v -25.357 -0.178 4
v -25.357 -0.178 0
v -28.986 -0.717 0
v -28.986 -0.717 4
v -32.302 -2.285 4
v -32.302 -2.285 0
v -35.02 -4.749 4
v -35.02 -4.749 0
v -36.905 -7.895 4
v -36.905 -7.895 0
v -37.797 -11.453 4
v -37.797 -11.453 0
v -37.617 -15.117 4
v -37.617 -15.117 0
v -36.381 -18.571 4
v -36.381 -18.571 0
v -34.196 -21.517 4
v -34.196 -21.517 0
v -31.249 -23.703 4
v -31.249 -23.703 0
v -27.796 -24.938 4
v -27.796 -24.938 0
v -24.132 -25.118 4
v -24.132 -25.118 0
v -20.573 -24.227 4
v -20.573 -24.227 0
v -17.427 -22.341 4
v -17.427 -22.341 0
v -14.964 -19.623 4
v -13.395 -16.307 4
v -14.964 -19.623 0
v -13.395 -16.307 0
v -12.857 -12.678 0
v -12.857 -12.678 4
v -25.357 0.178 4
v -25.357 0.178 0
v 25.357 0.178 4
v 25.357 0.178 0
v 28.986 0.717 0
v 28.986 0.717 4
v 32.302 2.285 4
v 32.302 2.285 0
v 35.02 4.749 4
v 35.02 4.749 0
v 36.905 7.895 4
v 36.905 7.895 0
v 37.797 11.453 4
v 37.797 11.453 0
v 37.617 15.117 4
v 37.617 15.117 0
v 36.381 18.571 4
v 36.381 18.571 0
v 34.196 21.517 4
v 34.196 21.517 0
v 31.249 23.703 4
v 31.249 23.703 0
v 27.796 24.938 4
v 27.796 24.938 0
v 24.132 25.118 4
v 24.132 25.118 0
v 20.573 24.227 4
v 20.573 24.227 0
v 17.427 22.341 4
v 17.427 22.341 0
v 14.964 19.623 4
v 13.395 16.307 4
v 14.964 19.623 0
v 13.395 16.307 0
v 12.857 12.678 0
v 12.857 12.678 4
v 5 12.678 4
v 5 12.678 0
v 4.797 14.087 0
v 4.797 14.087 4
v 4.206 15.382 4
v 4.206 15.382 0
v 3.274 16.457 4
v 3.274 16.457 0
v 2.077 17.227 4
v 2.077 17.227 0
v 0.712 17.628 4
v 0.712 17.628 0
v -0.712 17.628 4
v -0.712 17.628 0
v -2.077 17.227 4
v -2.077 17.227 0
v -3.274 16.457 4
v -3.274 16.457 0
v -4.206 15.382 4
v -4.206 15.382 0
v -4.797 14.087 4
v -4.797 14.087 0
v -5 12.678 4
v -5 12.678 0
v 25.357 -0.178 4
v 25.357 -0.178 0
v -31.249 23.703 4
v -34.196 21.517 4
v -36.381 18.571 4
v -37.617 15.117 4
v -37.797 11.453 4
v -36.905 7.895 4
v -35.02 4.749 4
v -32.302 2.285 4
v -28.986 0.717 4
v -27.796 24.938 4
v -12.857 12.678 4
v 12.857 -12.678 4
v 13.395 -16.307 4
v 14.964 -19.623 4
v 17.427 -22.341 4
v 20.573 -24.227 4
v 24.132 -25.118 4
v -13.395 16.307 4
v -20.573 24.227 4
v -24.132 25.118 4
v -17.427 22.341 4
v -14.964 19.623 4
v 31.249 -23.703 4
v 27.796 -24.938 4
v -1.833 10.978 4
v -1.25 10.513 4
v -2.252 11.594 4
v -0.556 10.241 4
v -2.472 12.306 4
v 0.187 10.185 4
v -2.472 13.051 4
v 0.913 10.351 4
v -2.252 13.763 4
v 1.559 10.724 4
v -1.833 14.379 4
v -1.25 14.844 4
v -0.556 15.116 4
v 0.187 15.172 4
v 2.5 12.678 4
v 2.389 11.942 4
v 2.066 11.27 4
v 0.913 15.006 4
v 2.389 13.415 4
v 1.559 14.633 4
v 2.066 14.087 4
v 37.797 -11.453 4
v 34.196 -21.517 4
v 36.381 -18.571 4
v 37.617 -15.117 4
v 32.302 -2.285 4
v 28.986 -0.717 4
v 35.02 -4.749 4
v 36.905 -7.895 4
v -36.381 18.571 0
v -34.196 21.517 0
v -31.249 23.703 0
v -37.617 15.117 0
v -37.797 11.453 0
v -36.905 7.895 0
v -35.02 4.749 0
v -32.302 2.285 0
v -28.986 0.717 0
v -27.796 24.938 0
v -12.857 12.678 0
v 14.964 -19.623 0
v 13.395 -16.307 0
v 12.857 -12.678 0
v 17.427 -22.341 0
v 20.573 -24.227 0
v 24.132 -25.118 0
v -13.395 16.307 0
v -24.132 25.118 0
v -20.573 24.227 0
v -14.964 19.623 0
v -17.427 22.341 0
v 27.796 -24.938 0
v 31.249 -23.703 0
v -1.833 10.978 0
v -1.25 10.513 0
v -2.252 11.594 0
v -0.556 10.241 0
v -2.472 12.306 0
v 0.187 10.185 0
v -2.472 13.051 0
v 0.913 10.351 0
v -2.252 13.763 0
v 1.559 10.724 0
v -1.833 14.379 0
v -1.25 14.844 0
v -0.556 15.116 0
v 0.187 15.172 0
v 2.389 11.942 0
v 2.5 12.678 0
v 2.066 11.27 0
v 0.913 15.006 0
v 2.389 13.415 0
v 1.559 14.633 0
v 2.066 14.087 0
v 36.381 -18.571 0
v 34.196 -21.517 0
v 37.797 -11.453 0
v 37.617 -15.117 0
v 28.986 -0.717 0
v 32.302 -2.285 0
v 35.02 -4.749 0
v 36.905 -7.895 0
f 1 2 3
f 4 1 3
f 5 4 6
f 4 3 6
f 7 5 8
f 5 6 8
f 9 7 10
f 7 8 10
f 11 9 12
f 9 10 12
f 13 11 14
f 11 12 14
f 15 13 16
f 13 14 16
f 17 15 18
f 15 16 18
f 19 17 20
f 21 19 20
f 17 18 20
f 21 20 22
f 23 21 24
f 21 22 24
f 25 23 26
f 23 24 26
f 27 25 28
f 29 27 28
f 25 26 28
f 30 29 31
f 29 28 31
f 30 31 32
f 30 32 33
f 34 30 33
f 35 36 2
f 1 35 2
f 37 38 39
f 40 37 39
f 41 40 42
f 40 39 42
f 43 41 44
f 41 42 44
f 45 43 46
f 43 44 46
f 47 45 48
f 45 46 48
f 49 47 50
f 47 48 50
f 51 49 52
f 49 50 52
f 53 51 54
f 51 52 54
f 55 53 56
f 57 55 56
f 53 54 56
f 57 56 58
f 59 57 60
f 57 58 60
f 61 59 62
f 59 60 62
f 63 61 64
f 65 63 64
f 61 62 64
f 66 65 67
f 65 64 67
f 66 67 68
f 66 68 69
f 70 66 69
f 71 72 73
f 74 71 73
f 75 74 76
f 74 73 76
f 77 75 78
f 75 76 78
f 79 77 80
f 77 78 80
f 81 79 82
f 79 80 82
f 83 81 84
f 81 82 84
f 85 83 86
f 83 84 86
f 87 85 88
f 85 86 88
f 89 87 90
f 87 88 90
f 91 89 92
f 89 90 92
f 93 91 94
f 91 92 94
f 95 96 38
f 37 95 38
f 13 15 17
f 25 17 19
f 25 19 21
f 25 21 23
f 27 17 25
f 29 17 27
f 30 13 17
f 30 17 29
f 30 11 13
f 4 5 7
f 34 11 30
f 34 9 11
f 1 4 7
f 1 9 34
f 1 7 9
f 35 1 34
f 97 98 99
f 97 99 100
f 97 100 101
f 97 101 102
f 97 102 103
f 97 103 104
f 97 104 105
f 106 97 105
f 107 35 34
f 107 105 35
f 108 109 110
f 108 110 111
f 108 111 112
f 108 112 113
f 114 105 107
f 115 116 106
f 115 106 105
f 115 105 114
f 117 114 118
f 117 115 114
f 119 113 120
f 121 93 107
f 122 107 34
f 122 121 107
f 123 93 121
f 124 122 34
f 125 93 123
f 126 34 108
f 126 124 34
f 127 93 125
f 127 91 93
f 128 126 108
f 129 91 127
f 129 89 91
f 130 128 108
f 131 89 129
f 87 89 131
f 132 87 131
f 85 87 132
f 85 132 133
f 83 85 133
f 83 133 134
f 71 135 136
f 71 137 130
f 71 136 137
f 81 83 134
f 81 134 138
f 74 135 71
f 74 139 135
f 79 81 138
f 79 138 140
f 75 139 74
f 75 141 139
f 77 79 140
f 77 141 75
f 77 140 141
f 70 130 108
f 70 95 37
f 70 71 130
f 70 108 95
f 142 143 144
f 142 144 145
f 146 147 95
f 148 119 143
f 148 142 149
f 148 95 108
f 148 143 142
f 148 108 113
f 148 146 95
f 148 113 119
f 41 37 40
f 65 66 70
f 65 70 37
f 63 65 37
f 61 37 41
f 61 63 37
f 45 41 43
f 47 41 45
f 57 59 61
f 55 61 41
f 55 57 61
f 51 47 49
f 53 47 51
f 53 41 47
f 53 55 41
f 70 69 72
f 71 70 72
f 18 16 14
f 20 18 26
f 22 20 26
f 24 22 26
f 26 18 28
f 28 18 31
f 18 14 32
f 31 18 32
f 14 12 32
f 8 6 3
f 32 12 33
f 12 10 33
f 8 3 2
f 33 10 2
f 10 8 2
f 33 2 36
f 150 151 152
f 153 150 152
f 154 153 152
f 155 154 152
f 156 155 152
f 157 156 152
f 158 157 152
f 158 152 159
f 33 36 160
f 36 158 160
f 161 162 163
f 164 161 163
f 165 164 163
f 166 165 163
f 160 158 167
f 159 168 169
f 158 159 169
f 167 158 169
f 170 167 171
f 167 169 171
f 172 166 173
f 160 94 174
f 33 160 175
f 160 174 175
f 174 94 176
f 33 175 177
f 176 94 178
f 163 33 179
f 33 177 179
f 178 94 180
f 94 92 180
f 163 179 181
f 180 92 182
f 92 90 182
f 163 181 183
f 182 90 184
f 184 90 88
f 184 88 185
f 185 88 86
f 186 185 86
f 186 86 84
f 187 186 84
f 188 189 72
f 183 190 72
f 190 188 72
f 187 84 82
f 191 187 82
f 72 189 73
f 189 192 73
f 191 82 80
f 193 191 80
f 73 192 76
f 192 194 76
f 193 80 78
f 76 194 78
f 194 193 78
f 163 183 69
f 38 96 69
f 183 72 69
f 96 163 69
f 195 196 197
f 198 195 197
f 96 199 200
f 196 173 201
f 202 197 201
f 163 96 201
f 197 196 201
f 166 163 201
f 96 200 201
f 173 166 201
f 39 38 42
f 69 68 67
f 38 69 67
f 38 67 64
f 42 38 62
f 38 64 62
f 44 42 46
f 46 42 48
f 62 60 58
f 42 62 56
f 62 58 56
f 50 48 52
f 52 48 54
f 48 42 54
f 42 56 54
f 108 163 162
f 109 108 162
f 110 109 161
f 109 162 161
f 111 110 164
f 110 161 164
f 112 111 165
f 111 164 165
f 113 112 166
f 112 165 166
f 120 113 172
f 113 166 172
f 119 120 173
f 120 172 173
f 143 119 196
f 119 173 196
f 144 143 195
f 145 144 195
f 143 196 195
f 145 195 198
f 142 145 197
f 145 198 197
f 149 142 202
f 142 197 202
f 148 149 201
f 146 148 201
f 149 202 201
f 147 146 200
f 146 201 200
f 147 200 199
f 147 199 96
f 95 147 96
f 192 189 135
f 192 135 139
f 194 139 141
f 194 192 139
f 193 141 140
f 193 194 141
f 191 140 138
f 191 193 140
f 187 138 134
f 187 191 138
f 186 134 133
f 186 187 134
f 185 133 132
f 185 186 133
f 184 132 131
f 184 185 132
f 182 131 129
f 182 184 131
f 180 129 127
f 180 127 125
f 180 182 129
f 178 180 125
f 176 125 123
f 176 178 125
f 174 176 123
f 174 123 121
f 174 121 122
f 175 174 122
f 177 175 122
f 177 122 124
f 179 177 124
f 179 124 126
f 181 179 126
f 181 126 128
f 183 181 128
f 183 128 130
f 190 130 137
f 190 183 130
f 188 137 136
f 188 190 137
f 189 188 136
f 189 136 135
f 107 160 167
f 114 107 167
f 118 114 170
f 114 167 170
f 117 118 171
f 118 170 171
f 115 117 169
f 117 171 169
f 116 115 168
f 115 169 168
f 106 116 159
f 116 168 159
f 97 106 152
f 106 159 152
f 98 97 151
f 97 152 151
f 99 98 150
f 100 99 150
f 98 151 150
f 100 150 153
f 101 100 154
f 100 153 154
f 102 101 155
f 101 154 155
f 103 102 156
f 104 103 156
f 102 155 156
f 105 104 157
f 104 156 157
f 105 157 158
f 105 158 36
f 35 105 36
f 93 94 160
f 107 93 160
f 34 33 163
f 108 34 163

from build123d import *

# Parameters (mm, degrees)
F0_R     = 2.5
F1_DEPTH = 4


with BuildPart() as f1:
    # F0 (on Top) → F1 (new body)
    with BuildSketch(Plane.XY):
        with BuildLine():
            Line((-12.856996, -12.678498), (12.856996, -12.678498))
            ThreePointArc((12.856996, -12.678498), (34.195831, -21.517333), (25.356996, -0.178498))
            Line((25.356996, -0.178498), (25.356996, 0.178498))
            ThreePointArc((25.356996, 0.178498), (34.195831, 21.517333), (12.856996, 12.678498))
            Line((12.856996, 12.678498), (5, 12.678498))
            ThreePointArc((5, 12.678498), (0, 17.678498), (-5, 12.678498))
            Line((-5, 12.678498), (-12.856996, 12.678498))
            ThreePointArc((-12.856996, 12.678498), (-34.195831, 21.517333), (-25.356996, 0.178498))
            Line((-25.356996, 0.178498), (-25.356996, -0.178498))
            ThreePointArc((-25.356996, -0.178498), (-34.195831, -21.517333), (-12.856996, -12.678498))
        make_face()
        with Locations((0, 12.678498)):
            Circle(F0_R, mode=Mode.SUBTRACT)
    extrude(amount=F1_DEPTH)


solid = f1.part
